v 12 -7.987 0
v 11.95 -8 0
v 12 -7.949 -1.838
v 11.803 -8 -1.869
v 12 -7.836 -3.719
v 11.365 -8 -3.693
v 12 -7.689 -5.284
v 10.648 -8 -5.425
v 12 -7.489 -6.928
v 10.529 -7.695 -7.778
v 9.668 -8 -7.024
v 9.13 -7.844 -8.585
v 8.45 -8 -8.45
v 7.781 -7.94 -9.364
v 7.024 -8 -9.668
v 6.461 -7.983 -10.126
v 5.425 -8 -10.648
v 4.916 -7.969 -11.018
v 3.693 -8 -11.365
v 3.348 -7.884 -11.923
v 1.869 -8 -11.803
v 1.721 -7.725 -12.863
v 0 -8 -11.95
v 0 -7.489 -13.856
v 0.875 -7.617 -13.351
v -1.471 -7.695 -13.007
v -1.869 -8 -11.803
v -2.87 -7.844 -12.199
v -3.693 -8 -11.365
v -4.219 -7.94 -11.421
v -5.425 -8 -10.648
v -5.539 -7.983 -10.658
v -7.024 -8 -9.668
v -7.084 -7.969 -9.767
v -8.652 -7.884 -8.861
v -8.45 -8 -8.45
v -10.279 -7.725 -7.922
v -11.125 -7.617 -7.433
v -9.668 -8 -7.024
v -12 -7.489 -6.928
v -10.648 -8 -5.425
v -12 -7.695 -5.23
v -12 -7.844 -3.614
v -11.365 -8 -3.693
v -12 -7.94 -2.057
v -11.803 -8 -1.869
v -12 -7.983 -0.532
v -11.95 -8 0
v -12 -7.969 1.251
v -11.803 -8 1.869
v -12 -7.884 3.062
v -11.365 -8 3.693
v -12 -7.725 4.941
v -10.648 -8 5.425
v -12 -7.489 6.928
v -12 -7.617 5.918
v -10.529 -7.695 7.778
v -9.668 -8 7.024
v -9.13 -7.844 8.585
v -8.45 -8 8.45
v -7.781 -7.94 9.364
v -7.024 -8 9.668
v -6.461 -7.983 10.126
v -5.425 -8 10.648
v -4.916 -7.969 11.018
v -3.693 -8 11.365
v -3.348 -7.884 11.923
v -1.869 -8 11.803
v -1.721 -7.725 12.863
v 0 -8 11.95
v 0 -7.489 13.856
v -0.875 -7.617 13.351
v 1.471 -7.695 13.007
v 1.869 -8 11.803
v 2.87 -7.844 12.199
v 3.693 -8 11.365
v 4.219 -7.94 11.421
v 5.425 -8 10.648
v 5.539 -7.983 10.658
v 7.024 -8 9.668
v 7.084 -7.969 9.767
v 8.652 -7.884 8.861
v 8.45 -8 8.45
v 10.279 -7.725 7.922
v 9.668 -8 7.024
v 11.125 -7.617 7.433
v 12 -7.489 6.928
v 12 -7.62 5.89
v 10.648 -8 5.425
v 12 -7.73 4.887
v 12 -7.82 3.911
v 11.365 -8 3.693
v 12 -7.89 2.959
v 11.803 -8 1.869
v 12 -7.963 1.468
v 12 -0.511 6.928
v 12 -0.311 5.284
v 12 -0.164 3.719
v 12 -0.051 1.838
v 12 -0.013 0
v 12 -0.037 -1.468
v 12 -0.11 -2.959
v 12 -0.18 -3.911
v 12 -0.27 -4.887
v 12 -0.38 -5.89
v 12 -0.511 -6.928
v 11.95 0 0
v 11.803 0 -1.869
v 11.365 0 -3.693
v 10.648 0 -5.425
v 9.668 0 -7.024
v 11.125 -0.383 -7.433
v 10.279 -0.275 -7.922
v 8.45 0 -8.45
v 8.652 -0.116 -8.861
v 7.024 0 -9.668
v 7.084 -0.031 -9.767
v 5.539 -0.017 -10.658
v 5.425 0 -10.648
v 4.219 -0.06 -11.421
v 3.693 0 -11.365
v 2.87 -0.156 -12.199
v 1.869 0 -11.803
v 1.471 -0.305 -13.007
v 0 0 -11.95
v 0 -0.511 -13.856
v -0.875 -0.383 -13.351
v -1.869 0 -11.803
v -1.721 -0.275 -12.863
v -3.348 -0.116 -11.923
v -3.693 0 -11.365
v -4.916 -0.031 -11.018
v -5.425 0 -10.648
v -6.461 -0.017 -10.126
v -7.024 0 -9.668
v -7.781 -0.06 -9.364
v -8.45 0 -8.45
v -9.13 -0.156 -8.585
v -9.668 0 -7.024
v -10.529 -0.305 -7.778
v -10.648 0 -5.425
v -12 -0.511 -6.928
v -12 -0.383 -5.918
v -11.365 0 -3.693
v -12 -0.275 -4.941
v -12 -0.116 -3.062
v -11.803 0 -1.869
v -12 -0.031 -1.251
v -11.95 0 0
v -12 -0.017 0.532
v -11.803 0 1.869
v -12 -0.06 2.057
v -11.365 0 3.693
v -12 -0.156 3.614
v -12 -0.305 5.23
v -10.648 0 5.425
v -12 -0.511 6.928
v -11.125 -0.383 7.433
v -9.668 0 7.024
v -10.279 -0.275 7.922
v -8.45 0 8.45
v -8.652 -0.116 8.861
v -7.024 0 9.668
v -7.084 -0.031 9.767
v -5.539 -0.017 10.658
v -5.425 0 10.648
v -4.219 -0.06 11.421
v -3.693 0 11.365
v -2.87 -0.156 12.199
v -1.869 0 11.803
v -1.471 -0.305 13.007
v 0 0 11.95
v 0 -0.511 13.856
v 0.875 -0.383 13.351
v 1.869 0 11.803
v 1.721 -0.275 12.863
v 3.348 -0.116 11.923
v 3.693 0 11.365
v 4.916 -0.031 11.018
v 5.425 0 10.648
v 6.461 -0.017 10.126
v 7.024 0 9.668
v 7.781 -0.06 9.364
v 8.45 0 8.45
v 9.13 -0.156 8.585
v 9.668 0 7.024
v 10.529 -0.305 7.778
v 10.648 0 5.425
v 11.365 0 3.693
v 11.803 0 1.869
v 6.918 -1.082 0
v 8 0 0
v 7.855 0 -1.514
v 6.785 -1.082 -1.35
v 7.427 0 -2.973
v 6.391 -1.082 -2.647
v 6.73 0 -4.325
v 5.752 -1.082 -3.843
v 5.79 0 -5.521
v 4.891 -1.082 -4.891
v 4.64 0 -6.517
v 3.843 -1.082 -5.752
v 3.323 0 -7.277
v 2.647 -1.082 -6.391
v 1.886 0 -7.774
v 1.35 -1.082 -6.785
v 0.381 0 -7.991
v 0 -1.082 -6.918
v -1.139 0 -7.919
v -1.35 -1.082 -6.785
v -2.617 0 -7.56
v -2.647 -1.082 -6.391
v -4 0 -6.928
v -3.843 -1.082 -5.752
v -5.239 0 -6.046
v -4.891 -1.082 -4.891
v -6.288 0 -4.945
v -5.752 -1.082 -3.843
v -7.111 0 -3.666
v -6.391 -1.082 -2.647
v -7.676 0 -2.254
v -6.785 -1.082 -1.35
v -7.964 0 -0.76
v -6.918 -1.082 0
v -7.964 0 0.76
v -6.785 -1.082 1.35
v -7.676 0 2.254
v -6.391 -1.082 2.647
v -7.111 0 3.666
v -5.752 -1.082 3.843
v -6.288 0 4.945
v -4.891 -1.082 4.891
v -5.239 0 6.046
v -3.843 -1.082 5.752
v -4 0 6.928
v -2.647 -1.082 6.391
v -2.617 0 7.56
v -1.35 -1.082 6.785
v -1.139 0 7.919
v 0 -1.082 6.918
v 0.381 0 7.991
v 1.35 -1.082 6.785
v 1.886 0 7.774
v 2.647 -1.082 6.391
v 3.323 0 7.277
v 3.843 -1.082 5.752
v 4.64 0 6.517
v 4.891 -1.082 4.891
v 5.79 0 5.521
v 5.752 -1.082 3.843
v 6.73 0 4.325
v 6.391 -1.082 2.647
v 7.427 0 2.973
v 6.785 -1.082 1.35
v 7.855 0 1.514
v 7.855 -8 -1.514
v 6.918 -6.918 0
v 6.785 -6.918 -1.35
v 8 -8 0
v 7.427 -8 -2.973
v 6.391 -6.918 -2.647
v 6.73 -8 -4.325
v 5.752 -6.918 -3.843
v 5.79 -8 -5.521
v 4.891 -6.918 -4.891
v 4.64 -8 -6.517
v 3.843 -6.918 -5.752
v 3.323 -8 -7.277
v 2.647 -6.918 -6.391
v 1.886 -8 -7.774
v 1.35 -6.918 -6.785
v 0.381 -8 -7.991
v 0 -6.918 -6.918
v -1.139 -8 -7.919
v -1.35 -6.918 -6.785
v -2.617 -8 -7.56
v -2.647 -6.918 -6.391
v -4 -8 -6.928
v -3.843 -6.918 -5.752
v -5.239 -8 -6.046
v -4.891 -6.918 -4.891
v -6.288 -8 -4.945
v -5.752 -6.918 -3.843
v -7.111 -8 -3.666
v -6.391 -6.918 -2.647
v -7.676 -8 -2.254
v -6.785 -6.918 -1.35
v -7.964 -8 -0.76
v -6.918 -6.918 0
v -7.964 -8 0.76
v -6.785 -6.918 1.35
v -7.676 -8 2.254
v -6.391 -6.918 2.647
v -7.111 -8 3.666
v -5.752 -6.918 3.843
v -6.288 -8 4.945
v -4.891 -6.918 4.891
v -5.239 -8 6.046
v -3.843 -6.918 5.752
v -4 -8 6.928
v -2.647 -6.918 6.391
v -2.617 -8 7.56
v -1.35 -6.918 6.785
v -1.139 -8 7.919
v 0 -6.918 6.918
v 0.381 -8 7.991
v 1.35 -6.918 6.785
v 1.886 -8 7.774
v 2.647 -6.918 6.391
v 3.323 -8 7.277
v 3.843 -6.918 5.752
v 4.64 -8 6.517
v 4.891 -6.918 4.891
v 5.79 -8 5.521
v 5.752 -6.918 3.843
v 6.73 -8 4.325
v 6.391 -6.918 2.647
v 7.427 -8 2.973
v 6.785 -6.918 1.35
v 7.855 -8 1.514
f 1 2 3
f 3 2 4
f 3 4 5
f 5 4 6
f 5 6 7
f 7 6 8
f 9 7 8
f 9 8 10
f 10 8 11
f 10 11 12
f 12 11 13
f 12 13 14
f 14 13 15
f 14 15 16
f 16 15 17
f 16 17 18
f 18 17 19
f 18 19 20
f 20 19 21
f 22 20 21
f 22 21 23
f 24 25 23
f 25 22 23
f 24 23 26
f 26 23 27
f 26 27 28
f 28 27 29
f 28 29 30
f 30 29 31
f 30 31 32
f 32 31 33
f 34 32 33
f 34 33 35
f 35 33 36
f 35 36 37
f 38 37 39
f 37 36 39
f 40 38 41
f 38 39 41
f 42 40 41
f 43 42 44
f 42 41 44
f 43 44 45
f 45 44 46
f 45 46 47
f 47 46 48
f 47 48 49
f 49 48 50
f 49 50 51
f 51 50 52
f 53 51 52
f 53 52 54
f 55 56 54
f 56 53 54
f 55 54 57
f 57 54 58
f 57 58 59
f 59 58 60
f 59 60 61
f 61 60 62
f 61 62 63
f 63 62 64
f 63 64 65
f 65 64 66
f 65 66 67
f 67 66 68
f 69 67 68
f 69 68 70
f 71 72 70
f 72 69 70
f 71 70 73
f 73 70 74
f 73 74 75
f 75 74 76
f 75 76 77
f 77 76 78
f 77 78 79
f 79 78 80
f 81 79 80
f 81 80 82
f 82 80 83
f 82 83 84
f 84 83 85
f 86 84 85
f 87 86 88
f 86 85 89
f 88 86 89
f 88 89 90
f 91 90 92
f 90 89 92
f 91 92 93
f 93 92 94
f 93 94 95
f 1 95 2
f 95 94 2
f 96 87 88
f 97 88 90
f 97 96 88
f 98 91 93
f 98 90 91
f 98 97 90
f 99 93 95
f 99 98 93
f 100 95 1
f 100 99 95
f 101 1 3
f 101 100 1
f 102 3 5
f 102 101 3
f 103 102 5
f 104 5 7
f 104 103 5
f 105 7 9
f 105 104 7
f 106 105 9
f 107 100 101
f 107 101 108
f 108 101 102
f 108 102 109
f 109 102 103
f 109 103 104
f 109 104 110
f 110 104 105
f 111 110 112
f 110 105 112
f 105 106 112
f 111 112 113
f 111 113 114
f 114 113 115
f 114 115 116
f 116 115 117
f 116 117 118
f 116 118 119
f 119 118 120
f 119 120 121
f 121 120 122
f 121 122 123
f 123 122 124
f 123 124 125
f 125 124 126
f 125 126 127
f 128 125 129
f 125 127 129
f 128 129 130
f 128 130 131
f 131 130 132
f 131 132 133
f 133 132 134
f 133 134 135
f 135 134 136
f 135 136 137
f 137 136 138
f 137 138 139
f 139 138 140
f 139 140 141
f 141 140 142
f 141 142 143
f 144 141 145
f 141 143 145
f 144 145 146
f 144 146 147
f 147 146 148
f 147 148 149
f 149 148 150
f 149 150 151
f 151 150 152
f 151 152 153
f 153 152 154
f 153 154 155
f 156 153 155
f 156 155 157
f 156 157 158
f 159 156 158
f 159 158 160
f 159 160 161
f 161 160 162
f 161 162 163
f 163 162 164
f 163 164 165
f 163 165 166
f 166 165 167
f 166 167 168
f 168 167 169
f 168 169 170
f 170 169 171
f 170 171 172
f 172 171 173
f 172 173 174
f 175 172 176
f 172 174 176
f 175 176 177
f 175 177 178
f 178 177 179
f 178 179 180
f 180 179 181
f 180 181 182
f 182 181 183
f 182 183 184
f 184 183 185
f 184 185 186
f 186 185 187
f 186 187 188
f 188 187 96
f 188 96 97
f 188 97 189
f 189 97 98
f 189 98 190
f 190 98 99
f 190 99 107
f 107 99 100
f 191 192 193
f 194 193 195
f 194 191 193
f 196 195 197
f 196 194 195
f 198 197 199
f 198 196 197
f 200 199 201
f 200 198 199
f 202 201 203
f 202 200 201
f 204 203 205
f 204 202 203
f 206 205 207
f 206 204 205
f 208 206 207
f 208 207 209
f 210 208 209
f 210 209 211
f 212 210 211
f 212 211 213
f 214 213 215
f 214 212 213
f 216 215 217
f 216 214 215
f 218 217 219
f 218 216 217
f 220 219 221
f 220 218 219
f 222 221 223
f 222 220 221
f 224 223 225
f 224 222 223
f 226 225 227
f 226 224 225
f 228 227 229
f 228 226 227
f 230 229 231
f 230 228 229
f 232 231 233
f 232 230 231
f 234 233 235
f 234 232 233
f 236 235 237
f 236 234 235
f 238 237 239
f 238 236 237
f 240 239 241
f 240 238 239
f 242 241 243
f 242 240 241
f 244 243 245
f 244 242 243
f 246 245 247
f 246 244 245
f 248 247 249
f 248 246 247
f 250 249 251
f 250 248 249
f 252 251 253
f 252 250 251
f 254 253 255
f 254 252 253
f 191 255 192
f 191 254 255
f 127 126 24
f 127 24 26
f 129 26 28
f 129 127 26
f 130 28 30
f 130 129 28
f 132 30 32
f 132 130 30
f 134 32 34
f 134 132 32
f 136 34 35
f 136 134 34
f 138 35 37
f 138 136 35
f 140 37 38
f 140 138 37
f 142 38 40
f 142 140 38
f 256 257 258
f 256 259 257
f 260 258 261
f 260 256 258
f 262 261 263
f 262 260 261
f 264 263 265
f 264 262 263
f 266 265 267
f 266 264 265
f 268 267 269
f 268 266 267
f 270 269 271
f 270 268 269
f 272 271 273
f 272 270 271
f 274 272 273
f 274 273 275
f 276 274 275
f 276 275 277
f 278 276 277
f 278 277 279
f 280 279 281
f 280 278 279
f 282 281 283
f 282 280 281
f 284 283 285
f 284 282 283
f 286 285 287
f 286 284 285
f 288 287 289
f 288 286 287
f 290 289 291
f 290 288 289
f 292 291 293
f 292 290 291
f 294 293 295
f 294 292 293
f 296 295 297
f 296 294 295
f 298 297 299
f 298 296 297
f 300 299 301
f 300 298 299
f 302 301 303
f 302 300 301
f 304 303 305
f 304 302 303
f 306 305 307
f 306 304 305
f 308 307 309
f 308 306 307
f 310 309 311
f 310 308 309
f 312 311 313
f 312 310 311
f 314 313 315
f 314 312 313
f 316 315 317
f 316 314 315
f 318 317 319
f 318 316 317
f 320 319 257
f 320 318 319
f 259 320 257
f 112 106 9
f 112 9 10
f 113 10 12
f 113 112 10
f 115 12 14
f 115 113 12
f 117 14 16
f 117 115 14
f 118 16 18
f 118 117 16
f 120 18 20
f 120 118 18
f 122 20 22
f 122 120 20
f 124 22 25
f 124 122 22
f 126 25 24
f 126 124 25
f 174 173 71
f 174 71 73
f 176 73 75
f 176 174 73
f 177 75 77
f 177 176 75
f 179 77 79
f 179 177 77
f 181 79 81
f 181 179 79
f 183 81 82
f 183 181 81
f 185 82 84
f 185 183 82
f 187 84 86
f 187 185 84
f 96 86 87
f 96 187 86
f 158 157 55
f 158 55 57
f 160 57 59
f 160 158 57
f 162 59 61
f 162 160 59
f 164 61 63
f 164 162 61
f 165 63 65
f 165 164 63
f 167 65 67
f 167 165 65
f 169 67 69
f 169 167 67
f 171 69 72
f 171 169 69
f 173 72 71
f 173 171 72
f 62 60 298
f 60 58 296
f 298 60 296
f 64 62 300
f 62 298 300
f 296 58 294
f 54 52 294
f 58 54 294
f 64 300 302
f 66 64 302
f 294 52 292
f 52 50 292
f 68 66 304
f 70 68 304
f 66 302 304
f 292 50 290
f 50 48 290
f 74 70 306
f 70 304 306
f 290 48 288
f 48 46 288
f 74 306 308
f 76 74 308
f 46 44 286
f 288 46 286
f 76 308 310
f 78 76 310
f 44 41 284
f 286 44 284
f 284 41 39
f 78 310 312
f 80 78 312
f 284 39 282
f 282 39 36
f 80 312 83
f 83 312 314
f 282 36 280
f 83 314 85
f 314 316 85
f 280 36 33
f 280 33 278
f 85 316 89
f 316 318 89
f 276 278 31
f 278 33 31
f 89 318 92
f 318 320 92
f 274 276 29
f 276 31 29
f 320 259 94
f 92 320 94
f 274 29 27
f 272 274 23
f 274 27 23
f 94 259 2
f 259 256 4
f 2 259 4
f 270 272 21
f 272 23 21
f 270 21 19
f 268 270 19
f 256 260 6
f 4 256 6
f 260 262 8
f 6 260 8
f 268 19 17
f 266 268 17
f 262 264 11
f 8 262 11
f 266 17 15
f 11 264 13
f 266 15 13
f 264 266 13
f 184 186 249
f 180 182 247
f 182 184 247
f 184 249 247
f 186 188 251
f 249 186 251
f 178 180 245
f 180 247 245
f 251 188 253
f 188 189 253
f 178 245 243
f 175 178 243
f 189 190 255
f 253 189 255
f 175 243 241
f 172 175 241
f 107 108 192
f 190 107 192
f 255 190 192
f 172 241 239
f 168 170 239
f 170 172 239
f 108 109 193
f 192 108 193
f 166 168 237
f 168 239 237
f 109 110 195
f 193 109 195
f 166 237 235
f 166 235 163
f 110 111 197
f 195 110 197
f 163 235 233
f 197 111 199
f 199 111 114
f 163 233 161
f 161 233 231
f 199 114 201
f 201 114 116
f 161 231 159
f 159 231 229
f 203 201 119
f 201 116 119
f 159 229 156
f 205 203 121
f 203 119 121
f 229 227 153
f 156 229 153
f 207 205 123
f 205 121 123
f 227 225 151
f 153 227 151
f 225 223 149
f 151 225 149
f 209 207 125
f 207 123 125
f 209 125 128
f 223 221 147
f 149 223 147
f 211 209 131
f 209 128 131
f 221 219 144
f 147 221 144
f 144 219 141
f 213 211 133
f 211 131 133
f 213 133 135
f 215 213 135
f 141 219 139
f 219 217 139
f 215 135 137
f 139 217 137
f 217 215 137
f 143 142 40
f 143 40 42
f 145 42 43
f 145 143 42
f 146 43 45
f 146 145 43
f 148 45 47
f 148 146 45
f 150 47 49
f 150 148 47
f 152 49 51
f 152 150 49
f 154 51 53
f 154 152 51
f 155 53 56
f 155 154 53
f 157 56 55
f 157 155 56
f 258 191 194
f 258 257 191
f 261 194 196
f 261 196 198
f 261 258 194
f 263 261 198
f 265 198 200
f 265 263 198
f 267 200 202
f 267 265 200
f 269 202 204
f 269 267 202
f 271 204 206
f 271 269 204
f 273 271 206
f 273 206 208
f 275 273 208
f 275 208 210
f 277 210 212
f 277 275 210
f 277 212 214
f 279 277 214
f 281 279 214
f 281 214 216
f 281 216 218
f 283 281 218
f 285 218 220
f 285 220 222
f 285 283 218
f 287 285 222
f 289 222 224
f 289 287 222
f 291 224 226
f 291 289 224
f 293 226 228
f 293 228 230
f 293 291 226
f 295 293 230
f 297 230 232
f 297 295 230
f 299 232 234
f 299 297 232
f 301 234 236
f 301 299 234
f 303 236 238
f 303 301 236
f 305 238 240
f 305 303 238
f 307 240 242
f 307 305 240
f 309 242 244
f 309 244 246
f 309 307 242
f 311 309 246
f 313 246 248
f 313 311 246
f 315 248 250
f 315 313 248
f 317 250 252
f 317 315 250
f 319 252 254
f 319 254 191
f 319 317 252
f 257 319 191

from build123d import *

# Parameters (mm, degrees)
CUT_EXTRUDE1_DEPTH      = 9
CUT_EXTRUDE1_DEPTH_BACK = 9
SKETCH2_W               = 96
SKETCH2_H               = 96


with BuildPart() as part:
    # Sketch1 → Revolve1 (revolve)
    with BuildSketch(Plane.XY):
        Polygon((0, 0), (11.95, 0), (26.87820323, -4), (11.95, -8), (0, -8), align=None)
    revolve(axis=Axis((0, -8, 0), (0, 1, 0)))

    # Sketch2 → Cut-Extrude1 (cut, two sides: drawn at the far end of the back side and taken through both)
    with BuildSketch(Plane(origin=(0, 0, 0), x_dir=(1, 0, 0), z_dir=(0, 1, 0)).offset(-CUT_EXTRUDE1_DEPTH_BACK)):
        Rectangle(SKETCH2_W, SKETCH2_H)
        Polygon((-12, -6.92820323), (0, -13.856406461), (12, -6.92820323), (12, 6.92820323), (0, 13.856406461), (-12, 6.92820323), align=None, mode=Mode.SUBTRACT)
    extrude(amount=CUT_EXTRUDE1_DEPTH + CUT_EXTRUDE1_DEPTH_BACK, mode=Mode.SUBTRACT)

    # Sketch3 → Cut-Revolve1 (revolve, cut)
    with BuildSketch(Plane.XY):
        Polygon((0, 0), (8, 0), (6.9175, -1.0825), (6.9175, -6.9175), (8, -8), (0, -8), align=None)
    revolve(axis=Axis((0, -8, 0), (0, 1, 0)), mode=Mode.SUBTRACT)


solid = part.part
